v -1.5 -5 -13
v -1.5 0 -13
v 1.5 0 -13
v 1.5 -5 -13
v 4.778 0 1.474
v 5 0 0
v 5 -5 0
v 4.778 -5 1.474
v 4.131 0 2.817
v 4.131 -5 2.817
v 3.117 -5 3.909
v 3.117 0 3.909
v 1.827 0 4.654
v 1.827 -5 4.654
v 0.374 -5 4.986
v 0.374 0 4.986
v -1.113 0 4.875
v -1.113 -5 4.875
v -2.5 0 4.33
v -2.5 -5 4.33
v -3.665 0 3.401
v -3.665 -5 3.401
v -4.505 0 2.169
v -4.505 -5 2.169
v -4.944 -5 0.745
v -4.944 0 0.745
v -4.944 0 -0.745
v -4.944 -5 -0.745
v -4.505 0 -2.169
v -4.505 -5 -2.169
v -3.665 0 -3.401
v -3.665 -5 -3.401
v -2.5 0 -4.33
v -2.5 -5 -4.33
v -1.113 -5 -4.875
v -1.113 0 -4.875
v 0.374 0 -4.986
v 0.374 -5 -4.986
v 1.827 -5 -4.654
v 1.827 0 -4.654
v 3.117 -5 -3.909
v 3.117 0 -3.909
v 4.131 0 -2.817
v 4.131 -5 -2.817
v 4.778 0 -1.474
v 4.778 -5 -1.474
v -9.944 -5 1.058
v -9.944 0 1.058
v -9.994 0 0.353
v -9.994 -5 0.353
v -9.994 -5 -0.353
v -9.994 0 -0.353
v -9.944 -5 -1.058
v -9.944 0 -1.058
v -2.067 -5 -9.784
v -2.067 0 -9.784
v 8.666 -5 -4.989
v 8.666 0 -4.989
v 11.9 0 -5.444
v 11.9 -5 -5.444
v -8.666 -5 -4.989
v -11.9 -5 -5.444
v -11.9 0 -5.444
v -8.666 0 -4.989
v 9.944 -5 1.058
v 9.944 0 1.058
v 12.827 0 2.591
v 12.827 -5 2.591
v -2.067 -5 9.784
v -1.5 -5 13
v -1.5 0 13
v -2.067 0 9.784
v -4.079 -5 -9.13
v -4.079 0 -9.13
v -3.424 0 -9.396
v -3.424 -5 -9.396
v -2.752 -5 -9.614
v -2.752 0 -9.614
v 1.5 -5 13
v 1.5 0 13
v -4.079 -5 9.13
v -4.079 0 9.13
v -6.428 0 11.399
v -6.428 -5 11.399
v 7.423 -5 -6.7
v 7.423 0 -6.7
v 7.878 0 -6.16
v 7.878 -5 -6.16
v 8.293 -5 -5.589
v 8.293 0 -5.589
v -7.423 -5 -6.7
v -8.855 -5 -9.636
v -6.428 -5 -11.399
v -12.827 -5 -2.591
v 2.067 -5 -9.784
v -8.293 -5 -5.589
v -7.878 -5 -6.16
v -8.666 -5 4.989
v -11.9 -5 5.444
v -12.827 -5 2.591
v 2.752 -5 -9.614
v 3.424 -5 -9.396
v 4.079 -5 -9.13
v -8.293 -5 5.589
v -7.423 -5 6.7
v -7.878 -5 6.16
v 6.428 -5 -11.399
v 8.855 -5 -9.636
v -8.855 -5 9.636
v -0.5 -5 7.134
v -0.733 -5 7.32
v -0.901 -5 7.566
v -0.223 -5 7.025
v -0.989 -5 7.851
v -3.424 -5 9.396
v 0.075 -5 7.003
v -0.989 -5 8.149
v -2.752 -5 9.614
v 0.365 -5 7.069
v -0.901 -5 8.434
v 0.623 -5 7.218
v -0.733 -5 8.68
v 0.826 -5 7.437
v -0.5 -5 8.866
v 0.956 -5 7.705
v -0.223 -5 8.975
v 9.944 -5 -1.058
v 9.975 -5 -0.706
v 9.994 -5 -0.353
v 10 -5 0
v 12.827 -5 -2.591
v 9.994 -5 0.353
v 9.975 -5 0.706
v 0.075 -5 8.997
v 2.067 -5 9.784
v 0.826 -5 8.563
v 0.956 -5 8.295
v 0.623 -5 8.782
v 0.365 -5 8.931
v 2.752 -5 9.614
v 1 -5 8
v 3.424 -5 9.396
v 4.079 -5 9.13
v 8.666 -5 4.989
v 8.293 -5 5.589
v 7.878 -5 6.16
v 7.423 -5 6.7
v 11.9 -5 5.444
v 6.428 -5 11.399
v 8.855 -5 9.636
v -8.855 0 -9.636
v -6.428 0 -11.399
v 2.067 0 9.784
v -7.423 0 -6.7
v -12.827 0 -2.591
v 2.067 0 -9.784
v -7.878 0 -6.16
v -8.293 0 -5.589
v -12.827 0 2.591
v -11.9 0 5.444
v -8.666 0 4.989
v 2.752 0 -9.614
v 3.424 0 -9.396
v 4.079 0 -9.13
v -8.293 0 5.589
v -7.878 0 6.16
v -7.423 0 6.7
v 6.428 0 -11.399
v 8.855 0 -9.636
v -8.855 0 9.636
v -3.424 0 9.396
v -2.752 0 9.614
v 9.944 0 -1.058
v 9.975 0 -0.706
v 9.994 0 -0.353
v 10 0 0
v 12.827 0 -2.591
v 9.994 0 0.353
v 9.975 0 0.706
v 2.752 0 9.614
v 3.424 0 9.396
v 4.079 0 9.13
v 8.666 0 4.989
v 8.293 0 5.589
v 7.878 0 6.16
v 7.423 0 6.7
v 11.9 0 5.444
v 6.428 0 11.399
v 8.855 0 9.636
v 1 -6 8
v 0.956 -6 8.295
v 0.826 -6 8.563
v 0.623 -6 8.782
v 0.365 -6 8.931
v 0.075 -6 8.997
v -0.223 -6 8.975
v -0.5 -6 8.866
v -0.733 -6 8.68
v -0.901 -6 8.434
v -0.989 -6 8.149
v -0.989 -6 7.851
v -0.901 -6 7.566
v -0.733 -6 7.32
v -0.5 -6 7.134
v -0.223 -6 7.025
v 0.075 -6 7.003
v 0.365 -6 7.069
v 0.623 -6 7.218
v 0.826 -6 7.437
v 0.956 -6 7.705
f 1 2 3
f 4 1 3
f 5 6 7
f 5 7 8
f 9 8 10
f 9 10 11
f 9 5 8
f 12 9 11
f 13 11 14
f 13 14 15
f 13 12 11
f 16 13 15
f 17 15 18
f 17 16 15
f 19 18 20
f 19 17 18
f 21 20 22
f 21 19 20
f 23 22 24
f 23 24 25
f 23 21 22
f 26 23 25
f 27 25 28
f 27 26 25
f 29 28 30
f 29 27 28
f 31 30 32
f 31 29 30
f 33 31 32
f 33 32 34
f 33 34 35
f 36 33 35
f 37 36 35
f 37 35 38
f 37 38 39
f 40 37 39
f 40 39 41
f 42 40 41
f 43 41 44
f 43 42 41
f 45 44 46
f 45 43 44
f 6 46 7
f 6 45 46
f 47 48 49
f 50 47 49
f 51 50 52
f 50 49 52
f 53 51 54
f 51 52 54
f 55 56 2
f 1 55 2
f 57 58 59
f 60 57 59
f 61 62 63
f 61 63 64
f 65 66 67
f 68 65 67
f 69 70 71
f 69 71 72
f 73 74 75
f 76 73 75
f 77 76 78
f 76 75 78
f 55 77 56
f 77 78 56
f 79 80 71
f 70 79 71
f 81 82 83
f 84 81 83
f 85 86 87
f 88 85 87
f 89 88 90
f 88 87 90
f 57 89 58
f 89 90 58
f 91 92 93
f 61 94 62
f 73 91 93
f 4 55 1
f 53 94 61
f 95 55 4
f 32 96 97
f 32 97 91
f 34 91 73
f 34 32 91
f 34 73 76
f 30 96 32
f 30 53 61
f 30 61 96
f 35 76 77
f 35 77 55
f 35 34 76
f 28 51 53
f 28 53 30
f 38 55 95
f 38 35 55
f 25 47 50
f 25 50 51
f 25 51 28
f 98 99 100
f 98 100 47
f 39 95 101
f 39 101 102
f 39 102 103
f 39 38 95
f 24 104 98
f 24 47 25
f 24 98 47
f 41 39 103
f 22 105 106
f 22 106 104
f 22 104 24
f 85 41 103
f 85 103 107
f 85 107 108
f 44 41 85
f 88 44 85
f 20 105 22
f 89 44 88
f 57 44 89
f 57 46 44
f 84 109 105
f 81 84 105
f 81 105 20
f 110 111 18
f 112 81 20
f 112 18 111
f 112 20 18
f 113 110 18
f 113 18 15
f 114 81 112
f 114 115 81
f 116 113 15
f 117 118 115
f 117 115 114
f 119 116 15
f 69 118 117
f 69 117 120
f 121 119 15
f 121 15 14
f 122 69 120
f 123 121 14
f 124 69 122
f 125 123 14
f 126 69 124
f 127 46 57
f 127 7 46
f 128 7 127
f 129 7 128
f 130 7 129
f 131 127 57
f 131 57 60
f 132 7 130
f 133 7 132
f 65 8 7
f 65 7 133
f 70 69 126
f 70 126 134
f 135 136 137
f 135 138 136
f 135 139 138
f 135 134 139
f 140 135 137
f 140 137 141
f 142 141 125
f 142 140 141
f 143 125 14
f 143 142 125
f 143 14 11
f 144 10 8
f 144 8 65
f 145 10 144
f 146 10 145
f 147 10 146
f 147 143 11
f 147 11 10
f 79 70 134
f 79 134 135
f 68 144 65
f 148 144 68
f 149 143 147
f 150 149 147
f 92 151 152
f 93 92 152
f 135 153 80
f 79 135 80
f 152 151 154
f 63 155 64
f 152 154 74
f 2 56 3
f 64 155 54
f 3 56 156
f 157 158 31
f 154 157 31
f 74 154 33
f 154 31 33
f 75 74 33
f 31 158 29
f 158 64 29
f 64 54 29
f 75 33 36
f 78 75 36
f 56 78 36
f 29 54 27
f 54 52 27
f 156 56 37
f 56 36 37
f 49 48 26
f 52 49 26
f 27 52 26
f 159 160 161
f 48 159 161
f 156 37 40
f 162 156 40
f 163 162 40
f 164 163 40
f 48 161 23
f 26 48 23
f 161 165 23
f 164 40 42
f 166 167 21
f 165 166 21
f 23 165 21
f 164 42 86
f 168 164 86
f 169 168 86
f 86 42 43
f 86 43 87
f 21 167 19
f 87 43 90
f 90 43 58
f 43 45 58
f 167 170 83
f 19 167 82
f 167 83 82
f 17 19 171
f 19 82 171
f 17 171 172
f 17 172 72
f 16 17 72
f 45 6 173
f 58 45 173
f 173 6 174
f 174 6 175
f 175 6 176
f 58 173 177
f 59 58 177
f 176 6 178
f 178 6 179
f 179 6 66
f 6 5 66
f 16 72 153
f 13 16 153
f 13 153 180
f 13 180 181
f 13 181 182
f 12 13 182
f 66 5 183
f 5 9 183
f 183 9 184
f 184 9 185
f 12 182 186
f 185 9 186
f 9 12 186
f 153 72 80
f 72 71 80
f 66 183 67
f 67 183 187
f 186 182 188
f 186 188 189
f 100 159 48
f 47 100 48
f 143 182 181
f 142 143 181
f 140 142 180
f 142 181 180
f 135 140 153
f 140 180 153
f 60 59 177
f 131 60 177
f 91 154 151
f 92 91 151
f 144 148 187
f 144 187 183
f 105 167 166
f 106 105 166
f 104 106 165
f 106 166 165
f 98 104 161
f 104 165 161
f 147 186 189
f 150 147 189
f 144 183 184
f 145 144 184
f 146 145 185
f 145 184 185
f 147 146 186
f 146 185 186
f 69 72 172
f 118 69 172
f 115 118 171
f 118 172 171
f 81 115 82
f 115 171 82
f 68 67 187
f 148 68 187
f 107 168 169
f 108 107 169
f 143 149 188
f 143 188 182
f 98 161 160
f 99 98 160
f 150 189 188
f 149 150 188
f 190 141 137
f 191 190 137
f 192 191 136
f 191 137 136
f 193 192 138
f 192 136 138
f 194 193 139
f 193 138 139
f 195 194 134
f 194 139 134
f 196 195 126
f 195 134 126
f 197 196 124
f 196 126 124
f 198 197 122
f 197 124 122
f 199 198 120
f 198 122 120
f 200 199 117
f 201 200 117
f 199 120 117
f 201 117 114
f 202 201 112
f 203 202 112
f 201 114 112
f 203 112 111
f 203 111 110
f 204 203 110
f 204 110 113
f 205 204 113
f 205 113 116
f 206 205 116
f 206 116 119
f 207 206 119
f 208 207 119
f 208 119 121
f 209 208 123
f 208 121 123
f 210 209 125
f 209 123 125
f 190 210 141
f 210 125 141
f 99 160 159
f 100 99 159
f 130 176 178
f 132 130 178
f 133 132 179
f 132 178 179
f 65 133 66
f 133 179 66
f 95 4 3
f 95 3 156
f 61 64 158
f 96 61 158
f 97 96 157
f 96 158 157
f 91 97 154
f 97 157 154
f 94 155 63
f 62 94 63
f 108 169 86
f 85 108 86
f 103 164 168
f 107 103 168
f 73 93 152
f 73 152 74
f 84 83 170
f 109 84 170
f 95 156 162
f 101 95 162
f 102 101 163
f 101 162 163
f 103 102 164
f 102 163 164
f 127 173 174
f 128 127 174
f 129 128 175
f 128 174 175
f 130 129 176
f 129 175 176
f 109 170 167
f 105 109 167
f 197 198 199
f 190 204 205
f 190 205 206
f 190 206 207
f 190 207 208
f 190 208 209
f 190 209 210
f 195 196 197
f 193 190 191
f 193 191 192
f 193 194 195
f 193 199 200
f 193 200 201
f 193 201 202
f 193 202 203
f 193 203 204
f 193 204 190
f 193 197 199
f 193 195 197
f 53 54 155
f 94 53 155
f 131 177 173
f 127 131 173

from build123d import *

# Parameters (mm, degrees)
F0_R     = 5
F1_DEPTH = 5
F2_R     = 1
F3_DEPTH = 1


with BuildPart() as f1:
    # F0 (on Front) → F1 (new body)
    with BuildSketch(Plane.XZ):
        with BuildLine():
            ThreePointArc((9.943923, -1.057539), (9.985971, -0.529512), (10, 0))
            ThreePointArc((10, 0), (9.985971, 0.529512), (9.943923, 1.057539))
            ThreePointArc((9.943923, 1.057539), (9.510565, 3.09017), (8.666409, 4.989325))
            ThreePointArc((8.666409, 4.989325), (8.09017, 5.877853), (7.423197, 6.700458))
            ThreePointArc((7.423197, 6.700458), (5.877853, 8.09017), (4.07862, 9.130436))
            ThreePointArc((4.07862, 9.130436), (3.09017, 9.510565), (2.067062, 9.784031))
            ThreePointArc((2.067062, 9.784031), (0, 10), (-2.067062, 9.784031))
            ThreePointArc((-2.067062, 9.784031), (-3.09017, 9.510565), (-4.07862, 9.130436))
            ThreePointArc((-4.07862, 9.130436), (-5.877853, 8.09017), (-7.423197, 6.700458))
            ThreePointArc((-7.423197, 6.700458), (-8.09017, 5.877853), (-8.666409, 4.989325))
            ThreePointArc((-8.666409, 4.989325), (-9.510565, 3.09017), (-9.943923, 1.057539))
            ThreePointArc((-9.943923, 1.057539), (-10, 0), (-9.943923, -1.057539))
            ThreePointArc((-9.943923, -1.057539), (-9.510565, -3.09017), (-8.666409, -4.989325))
            ThreePointArc((-8.666409, -4.989325), (-8.09017, -5.877853), (-7.423197, -6.700458))
            ThreePointArc((-7.423197, -6.700458), (-5.877853, -8.09017), (-4.07862, -9.130436))
            ThreePointArc((-4.07862, -9.130436), (-3.09017, -9.510565), (-2.067062, -9.784031))
            ThreePointArc((-2.067062, -9.784031), (0, -10), (2.067062, -9.784031))
            ThreePointArc((2.067062, -9.784031), (3.09017, -9.510565), (4.07862, -9.130436))
            ThreePointArc((4.07862, -9.130436), (5.877853, -8.09017), (7.423197, -6.700458))
            ThreePointArc((7.423197, -6.700458), (8.09017, -5.877853), (8.666409, -4.989325))
            ThreePointArc((8.666409, -4.989325), (9.510565, -3.09017), (9.943923, -1.057539))
        make_face()
        Circle(F0_R, mode=Mode.SUBTRACT)
        with BuildLine():
            ThreePointArc((8.666409, 4.989325), (9.510565, 3.09017), (9.943923, 1.057539))
            Line((9.943923, 1.057539), (12.82726, 2.590636))
            Line((12.82726, 2.590636), (11.900209, 5.443806))
            Line((11.900209, 5.443806), (8.666409, 4.989325))
        make_face()
        with BuildLine():
            Line((12.82726, -2.590636), (9.943923, -1.057539))
            ThreePointArc((9.943923, -1.057539), (9.510565, -3.09017), (8.666409, -4.989325))
            Line((8.666409, -4.989325), (11.900209, -5.443806))
            Line((11.900209, -5.443806), (12.82726, -2.590636))
        make_face()
        with BuildLine():
            ThreePointArc((4.07862, 9.130436), (5.877853, 8.09017), (7.423197, 6.700458))
            Line((7.423197, 6.700458), (8.854734, 9.635543))
            Line((8.854734, 9.635543), (6.427683, 11.398899))
            Line((6.427683, 11.398899), (4.07862, 9.130436))
        make_face()
        with BuildLine():
            Line((8.854734, -9.635543), (7.423197, -6.700458))
            ThreePointArc((7.423197, -6.700458), (5.877853, -8.09017), (4.07862, -9.130436))
            Line((4.07862, -9.130436), (6.427683, -11.398899))
            Line((6.427683, -11.398899), (8.854734, -9.635543))
        make_face()
        with BuildLine():
            ThreePointArc((-2.067062, 9.784031), (0, 10), (2.067062, 9.784031))
            Line((2.067062, 9.784031), (1.5, 13))
            Line((1.5, 13), (-1.5, 13))
            Line((-1.5, 13), (-2.067062, 9.784031))
        make_face()
        with BuildLine():
            Line((1.5, -13), (2.067062, -9.784031))
            ThreePointArc((2.067062, -9.784031), (0, -10), (-2.067062, -9.784031))
            Line((-2.067062, -9.784031), (-1.5, -13))
            Line((-1.5, -13), (1.5, -13))
        make_face()
        with BuildLine():
            ThreePointArc((-7.423197, 6.700458), (-5.877853, 8.09017), (-4.07862, 9.130436))
            Line((-4.07862, 9.130436), (-6.427683, 11.398899))
            Line((-6.427683, 11.398899), (-8.854734, 9.635543))
            Line((-8.854734, 9.635543), (-7.423197, 6.700458))
        make_face()
        with BuildLine():
            Line((-6.427683, -11.398899), (-4.07862, -9.130436))
            ThreePointArc((-4.07862, -9.130436), (-5.877853, -8.09017), (-7.423197, -6.700458))
            Line((-7.423197, -6.700458), (-8.854734, -9.635543))
            Line((-8.854734, -9.635543), (-6.427683, -11.398899))
        make_face()
        with BuildLine():
            ThreePointArc((-9.943923, 1.057539), (-9.510565, 3.09017), (-8.666409, 4.989325))
            Line((-8.666409, 4.989325), (-11.900209, 5.443806))
            Line((-11.900209, 5.443806), (-12.82726, 2.590636))
            Line((-12.82726, 2.590636), (-9.943923, 1.057539))
        make_face()
        with BuildLine():
            Line((-11.900209, -5.443806), (-8.666409, -4.989325))
            ThreePointArc((-8.666409, -4.989325), (-9.510565, -3.09017), (-9.943923, -1.057539))
            Line((-9.943923, -1.057539), (-12.82726, -2.590636))
            Line((-12.82726, -2.590636), (-11.900209, -5.443806))
        make_face()
    extrude(amount=F1_DEPTH)

    # F2 (on face) → F3 (join)
    with BuildSketch(Plane.XZ.offset(5)):
        with Locations((0, 8)):
            Circle(F2_R)
    extrude(amount=F3_DEPTH)


solid = f1.part
